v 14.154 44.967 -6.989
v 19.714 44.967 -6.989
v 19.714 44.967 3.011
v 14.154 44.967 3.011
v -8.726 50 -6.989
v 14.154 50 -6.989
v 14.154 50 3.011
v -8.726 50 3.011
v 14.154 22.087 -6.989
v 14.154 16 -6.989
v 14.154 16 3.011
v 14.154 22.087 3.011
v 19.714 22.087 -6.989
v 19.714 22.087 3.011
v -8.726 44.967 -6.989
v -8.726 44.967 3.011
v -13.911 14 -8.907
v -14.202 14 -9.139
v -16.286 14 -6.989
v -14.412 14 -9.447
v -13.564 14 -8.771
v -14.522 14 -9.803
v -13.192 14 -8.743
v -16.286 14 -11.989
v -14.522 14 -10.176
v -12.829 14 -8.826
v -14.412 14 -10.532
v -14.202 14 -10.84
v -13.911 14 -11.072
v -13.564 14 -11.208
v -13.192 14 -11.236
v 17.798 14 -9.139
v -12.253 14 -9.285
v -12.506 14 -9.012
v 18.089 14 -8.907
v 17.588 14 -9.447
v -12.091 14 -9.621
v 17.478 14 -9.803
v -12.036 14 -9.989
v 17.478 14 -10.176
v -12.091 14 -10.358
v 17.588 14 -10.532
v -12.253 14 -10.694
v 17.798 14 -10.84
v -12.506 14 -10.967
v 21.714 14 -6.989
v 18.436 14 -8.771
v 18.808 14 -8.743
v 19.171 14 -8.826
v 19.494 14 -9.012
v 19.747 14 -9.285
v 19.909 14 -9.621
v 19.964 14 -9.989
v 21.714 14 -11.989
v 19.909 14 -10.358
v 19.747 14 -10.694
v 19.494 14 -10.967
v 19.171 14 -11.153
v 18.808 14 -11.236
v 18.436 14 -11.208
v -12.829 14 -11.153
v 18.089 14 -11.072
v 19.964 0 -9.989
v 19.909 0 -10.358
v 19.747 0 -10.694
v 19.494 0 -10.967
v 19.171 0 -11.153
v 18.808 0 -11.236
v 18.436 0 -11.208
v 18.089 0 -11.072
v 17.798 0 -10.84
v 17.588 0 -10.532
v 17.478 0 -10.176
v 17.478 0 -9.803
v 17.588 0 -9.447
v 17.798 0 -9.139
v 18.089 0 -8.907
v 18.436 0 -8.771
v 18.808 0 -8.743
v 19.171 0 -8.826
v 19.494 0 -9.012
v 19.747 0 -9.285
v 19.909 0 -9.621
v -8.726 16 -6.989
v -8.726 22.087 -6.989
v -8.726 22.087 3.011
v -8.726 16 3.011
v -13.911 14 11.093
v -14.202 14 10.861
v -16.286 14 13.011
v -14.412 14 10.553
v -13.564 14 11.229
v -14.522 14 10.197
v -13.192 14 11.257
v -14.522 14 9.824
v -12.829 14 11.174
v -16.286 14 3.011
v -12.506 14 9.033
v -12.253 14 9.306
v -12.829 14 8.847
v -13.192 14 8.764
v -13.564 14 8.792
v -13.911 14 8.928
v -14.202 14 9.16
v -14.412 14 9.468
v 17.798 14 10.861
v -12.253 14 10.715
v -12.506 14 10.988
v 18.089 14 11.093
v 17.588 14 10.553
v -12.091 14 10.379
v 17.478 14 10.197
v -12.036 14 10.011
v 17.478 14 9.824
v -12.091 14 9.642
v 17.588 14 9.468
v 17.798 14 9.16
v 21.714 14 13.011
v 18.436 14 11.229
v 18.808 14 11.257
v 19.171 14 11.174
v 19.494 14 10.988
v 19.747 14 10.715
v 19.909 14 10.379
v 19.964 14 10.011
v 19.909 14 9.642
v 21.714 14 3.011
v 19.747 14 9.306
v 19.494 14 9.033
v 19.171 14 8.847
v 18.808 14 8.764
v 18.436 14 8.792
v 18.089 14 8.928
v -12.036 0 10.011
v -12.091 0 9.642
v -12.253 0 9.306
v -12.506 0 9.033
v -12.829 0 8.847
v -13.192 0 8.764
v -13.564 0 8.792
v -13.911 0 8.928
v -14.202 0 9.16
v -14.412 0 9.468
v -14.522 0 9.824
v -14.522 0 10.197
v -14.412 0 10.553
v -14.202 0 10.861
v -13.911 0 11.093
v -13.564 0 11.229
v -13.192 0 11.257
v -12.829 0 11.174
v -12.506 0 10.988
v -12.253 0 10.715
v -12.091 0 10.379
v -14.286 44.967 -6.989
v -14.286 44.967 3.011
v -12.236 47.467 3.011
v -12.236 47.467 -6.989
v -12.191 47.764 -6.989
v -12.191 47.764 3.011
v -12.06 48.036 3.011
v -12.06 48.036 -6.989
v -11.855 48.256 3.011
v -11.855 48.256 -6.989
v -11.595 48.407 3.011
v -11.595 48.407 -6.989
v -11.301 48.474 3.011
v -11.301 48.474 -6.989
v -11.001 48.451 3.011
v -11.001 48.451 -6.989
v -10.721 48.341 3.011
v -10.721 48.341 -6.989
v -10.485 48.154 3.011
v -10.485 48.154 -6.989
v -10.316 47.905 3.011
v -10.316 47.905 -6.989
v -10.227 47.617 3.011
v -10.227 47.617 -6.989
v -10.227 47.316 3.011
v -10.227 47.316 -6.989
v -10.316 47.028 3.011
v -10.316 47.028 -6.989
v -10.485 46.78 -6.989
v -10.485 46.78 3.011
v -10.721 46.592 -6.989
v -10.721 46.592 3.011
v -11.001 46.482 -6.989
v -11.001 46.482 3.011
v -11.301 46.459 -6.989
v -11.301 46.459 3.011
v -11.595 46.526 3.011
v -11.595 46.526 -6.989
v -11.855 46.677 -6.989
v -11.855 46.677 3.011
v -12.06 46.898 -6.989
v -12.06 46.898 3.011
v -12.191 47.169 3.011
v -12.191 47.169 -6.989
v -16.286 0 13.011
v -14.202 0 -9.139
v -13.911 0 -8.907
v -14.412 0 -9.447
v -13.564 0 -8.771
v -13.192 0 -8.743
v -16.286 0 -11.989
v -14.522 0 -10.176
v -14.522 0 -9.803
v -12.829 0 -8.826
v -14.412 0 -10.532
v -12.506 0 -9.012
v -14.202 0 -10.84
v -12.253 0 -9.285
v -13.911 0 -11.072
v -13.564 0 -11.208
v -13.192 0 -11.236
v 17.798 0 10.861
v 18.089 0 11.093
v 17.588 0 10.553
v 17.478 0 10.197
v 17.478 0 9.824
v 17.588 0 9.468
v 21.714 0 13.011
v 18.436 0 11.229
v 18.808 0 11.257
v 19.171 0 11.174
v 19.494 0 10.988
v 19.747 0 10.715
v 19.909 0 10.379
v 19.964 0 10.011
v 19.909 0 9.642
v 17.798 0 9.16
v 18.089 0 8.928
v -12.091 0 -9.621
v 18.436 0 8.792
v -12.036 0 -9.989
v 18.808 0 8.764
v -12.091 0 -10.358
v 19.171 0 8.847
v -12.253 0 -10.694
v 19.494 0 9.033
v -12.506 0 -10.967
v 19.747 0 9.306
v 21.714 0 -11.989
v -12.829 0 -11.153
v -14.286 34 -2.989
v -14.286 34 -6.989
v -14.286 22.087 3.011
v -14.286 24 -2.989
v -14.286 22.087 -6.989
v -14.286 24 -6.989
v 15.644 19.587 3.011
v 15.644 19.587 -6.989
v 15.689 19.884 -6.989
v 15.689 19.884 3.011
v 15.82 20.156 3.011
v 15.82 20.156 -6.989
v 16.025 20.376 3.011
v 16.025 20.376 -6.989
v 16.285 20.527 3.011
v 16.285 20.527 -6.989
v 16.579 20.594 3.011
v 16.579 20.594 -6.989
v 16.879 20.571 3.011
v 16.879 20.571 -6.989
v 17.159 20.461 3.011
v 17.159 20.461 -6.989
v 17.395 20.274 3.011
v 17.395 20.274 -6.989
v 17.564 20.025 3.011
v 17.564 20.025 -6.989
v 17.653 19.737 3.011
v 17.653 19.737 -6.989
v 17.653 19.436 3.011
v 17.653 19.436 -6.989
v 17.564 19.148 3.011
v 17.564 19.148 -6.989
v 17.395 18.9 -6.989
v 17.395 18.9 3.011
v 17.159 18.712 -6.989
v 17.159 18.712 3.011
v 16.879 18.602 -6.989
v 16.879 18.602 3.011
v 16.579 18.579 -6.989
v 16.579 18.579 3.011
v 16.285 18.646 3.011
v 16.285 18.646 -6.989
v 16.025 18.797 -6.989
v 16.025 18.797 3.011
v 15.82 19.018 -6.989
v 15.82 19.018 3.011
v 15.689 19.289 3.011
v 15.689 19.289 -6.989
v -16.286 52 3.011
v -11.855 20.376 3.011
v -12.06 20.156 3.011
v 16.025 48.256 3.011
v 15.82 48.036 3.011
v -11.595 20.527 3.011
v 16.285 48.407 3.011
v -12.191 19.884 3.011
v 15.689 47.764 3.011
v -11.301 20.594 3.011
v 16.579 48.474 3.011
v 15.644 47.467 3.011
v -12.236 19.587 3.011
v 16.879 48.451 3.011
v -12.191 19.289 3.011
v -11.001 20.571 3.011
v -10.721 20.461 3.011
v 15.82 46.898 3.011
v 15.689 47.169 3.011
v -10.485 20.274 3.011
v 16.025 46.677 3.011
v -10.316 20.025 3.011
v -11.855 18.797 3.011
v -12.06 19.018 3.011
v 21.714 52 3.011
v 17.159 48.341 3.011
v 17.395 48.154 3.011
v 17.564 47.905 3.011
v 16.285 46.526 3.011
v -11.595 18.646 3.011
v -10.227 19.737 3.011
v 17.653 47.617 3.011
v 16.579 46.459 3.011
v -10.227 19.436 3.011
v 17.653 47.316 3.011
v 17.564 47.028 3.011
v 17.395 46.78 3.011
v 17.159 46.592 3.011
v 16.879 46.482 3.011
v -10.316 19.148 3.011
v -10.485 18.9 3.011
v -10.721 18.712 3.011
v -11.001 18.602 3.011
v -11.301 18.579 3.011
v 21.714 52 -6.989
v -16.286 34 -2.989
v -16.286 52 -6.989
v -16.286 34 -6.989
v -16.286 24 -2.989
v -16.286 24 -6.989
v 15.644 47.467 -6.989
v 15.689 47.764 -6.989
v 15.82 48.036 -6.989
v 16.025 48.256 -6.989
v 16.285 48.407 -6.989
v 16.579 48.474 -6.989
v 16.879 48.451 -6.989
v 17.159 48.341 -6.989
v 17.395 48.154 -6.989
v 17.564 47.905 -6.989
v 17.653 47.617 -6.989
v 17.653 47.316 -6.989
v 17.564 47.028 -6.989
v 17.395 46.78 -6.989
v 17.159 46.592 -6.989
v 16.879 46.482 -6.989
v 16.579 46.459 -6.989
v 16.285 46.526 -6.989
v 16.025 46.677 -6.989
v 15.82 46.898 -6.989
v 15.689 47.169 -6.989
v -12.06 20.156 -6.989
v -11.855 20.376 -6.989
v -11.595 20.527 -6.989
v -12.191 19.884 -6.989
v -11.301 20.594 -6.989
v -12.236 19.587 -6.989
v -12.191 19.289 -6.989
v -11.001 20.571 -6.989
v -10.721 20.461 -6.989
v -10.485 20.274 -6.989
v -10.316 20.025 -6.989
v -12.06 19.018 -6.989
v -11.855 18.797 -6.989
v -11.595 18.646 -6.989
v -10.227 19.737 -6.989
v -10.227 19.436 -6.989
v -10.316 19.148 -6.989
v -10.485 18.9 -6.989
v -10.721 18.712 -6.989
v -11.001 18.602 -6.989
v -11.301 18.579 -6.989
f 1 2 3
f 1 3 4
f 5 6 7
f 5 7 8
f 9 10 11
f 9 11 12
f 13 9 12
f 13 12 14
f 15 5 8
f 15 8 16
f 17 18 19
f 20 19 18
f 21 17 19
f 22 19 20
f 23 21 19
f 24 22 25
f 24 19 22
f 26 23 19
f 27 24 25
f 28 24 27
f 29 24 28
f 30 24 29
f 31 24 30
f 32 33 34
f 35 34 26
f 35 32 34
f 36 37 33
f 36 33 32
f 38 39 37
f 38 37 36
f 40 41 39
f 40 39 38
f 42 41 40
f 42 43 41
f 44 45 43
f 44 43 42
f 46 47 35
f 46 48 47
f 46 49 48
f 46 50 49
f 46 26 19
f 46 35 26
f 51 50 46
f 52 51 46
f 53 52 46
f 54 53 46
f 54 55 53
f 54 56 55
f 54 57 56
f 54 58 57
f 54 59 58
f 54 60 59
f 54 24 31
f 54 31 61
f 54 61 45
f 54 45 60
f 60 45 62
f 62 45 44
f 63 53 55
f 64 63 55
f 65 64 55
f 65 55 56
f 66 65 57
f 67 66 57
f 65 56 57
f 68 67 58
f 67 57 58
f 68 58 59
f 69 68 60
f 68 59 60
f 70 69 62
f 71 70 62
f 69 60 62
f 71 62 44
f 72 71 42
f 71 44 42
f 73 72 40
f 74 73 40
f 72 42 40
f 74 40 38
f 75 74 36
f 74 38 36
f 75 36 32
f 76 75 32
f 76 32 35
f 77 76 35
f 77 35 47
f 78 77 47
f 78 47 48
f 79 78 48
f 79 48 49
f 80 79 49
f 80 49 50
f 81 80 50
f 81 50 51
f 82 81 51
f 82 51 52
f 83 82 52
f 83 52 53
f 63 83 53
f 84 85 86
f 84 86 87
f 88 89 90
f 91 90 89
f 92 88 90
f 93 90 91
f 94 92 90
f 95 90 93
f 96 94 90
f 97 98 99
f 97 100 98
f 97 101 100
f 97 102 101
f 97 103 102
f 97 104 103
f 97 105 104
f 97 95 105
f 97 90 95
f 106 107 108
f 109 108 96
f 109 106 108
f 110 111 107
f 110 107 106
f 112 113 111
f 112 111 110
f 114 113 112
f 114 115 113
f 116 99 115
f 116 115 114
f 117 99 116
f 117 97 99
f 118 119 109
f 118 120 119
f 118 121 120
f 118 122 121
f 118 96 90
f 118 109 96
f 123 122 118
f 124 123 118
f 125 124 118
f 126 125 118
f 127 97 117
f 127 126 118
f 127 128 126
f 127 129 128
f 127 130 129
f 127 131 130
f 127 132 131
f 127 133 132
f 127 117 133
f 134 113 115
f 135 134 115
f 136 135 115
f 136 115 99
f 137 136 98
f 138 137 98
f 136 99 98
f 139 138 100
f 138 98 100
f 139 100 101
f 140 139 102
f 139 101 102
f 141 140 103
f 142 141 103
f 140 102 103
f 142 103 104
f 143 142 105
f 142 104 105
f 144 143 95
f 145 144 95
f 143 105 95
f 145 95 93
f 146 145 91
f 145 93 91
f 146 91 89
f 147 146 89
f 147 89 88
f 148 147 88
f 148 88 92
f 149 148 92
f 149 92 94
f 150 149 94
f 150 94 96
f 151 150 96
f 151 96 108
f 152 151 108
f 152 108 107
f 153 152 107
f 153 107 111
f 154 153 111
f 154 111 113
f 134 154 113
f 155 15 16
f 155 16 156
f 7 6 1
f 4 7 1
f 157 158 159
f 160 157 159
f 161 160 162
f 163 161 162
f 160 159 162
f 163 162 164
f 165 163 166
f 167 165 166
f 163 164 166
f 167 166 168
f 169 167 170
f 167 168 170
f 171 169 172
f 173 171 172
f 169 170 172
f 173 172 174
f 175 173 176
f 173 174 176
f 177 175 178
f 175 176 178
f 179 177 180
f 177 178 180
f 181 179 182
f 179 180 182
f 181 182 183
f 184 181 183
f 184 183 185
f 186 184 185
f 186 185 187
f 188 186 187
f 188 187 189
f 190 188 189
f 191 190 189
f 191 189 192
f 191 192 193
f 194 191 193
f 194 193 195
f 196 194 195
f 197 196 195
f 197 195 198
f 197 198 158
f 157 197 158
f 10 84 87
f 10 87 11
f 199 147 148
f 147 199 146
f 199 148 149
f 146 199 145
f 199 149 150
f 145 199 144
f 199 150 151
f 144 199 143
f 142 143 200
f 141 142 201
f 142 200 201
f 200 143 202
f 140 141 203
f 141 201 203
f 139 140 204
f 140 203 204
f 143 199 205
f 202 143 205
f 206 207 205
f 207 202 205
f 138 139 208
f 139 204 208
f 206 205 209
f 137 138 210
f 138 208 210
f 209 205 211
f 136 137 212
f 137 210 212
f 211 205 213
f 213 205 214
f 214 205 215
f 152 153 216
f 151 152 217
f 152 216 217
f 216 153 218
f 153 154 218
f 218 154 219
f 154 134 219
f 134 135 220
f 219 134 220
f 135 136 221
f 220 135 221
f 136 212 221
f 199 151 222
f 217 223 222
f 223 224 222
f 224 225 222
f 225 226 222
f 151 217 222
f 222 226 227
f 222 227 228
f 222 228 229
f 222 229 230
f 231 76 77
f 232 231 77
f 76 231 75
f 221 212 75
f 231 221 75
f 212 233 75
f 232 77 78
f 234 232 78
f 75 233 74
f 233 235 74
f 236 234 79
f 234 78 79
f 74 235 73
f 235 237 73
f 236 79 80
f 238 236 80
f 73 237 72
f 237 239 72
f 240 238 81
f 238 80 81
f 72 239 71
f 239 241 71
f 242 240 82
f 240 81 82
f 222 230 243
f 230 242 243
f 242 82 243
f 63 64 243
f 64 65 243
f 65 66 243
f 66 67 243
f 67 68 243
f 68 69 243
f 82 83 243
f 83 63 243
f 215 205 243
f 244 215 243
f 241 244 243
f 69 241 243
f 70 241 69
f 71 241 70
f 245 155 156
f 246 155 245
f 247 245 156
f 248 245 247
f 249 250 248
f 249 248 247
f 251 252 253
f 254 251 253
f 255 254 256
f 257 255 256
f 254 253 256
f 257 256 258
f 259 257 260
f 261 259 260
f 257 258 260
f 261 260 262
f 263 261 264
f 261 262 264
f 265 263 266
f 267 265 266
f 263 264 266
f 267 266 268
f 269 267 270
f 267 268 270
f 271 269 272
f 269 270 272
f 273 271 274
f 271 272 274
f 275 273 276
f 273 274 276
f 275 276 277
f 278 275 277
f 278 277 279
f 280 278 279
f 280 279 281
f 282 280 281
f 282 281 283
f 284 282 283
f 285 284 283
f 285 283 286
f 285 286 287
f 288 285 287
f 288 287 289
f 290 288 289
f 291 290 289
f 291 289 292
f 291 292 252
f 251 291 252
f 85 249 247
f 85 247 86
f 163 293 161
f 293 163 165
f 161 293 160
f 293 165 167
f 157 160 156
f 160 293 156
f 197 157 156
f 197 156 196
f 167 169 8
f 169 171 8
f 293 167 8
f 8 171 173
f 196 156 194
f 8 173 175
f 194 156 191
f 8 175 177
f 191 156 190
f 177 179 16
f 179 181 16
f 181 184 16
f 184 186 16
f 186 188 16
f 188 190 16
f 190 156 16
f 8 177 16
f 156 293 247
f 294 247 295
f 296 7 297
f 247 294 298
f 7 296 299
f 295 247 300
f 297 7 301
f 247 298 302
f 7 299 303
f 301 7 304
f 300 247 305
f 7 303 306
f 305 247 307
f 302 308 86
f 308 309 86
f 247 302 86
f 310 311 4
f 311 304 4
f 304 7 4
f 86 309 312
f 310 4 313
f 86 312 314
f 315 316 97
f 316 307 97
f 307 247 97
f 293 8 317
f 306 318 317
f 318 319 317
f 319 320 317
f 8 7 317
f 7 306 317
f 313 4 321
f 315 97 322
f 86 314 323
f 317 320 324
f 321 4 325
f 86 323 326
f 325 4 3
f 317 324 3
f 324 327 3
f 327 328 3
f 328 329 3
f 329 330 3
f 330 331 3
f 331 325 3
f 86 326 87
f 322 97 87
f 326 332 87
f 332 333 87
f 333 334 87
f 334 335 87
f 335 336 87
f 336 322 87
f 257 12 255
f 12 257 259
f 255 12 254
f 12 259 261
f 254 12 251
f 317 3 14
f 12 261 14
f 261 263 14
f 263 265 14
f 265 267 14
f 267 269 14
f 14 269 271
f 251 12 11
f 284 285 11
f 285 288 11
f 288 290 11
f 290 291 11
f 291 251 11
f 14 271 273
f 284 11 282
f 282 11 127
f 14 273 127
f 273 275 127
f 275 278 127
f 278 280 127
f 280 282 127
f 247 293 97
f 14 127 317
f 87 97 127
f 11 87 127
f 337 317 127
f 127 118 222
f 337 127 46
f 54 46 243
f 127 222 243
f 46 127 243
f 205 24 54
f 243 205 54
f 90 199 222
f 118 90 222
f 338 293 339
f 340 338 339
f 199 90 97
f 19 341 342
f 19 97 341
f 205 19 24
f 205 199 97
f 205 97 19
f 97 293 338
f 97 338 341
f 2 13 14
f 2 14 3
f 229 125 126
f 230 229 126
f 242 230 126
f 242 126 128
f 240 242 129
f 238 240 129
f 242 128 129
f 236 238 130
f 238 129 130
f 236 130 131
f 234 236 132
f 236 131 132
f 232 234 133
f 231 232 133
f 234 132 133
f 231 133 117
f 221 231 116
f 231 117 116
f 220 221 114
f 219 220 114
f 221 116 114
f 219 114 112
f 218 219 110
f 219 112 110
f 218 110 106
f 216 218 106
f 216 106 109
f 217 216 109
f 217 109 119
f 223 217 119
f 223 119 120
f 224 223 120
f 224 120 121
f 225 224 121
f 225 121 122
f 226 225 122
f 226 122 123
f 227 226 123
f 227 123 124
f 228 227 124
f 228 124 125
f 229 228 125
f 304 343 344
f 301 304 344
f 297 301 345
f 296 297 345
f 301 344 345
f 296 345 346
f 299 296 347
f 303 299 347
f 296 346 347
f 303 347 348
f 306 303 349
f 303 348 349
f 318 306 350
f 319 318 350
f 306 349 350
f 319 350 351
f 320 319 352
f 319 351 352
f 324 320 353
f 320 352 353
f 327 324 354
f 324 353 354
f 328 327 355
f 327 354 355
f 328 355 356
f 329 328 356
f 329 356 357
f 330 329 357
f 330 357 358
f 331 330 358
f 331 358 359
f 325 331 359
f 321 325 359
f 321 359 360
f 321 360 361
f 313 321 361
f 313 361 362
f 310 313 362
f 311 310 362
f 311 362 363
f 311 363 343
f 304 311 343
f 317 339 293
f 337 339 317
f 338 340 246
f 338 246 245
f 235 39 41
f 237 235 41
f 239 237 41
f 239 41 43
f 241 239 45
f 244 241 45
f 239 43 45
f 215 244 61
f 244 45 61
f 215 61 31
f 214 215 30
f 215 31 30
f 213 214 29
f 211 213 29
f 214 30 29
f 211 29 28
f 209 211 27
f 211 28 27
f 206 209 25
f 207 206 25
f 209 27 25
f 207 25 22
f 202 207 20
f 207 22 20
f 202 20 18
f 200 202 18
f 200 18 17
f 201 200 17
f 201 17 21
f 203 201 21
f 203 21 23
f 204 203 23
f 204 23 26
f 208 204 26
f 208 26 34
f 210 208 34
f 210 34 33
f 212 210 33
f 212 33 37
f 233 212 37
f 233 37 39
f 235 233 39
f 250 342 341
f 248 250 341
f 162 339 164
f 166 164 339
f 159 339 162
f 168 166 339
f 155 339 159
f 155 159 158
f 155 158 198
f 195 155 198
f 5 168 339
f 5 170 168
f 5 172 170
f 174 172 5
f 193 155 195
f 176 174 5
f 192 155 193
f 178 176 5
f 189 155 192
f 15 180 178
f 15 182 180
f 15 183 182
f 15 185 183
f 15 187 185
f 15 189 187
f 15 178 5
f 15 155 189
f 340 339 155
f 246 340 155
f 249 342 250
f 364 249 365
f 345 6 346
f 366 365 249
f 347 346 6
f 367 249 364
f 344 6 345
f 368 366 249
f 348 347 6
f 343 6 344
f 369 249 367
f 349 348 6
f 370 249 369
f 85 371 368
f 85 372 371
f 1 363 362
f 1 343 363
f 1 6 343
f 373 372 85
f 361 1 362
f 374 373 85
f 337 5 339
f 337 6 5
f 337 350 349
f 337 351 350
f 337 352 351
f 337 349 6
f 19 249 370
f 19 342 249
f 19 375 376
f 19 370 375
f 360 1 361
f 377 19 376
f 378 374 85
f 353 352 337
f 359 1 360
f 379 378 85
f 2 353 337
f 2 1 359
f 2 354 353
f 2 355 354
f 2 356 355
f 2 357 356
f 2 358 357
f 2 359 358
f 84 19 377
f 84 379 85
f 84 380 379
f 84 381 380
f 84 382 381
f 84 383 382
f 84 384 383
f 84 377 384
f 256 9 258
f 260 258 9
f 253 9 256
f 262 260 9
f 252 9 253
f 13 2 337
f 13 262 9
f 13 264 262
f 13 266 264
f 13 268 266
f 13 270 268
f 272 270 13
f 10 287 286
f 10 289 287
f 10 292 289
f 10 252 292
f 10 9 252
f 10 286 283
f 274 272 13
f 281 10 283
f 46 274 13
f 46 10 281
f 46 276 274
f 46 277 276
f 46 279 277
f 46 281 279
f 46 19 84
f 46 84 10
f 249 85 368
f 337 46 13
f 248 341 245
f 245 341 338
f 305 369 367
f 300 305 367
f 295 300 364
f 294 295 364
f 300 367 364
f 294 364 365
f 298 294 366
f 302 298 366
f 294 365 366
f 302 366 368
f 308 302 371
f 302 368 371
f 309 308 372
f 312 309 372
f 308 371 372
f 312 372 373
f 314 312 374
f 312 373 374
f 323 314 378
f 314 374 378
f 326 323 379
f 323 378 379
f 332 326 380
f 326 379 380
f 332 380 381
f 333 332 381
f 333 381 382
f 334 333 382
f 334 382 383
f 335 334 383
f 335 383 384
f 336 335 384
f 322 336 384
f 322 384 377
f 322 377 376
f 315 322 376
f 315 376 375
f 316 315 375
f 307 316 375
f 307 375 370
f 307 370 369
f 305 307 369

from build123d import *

# Parameters (mm, degrees)
SKETCH1_W           = 38
SKETCH1_H           = 30
BOSS_EXTRUDE1_DEPTH = 14
SKETCH2_W           = 38
SKETCH2_H           = 10
BOSS_EXTRUDE2_DEPTH = 38
SKETCH3_R           = 1.01
CUT_EXTRUDE1_DEPTH  = 38
CUT_EXTRUDE2_DEPTH  = 38
SKETCH5_W           = 4
SKETCH5_H           = 10
CUT_EXTRUDE3_DEPTH  = 12
SKETCH6_R           = 1.25
CUT_EXTRUDE4_DEPTH  = 31
SKETCH8_W           = 38
SKETCH8_H           = 5
CUT_EXTRUDE5_DEPTH  = 31


with BuildPart() as part:
    # Sketch1 → Boss-Extrude1 (new body)
    with BuildSketch(Plane(origin=(0, 0, 0), x_dir=(1, 0, 0), z_dir=(0, 1, 0))):
        with Locations((2.714285714, 1.989417989)):
            Rectangle(SKETCH1_W, SKETCH1_H)
    extrude(amount=BOSS_EXTRUDE1_DEPTH)

    # Sketch2 → Boss-Extrude2 (add)
    with BuildSketch(Plane(origin=(0, 14, 0), x_dir=(1, 0, 0), z_dir=(0, 1, 0))):
        with Locations((2.714285714, 1.989417989)):
            Rectangle(SKETCH2_W, SKETCH2_H)
    extrude(amount=BOSS_EXTRUDE2_DEPTH)

    # Sketch3 → Cut-Extrude1 (cut)
    with BuildSketch(Plane(origin=(0, 0, -6.989417989), x_dir=(-1, 0, 0), z_dir=(0, 0, -1))):
        with Locations((-16.654285714, 47.466668182)):
            Circle(SKETCH3_R)
        with Locations((11.225714286, 47.466668182)):
            Circle(SKETCH3_R)
        with Locations((-16.654285714, 19.586668182)):
            Circle(SKETCH3_R)
        with Locations((11.225714286, 19.586668182)):
            Circle(SKETCH3_R)
    extrude(amount=-CUT_EXTRUDE1_DEPTH, mode=Mode.SUBTRACT)

    # Sketch4 → Cut-Extrude2 (cut)
    with BuildSketch(Plane(origin=(0, 0, -6.989417989), x_dir=(-1, 0, 0), z_dir=(0, 0, -1))):
        Polygon((-14.154285714, 47.396812474), (-14.154285714, 50), (8.725714286, 50), (8.725714286, 44.966668182), (14.285714286, 44.966668182), (14.285714286, 22.086668182), (8.725714286, 22.086668182), (8.725714286, 16), (-14.154285714, 16), (-14.154285714, 22.086668182), (-19.714285714, 22.086668182), (-19.714285714, 44.966668182), (-14.154285714, 44.966668182), align=None)
    extrude(amount=-CUT_EXTRUDE2_DEPTH, mode=Mode.SUBTRACT)

    # Sketch5 → Cut-Extrude3 (cut)
    with BuildSketch(Plane.ZY.offset(16.285714286)):
        with Locations((-4.989417989, 29)):
            Rectangle(SKETCH5_W, SKETCH5_H)
    extrude(amount=-CUT_EXTRUDE3_DEPTH, mode=Mode.SUBTRACT)

    # Sketch6 → Cut-Extrude4 (cut)
    with BuildSketch(Plane(origin=(0, 14, 0), x_dir=(1, 0, 0), z_dir=(0, 1, 0))):
        with Locations((-13.285714286, 9.989417989)):
            Circle(SKETCH6_R)
        with Locations((18.714285714, 9.989417989)):
            Circle(SKETCH6_R)
        with Locations((18.714285714, -10.010582011)):
            Circle(SKETCH6_R)
        with Locations((-13.285714286, -10.010582011)):
            Circle(SKETCH6_R)
    extrude(amount=-CUT_EXTRUDE4_DEPTH, mode=Mode.SUBTRACT)

    # Sketch8 → Cut-Extrude5 (cut)
    with BuildSketch(Plane(origin=(0, 14, 0), x_dir=(1, 0, 0), z_dir=(0, 1, 0))):
        with Locations((2.714285714, 14.489417989)):
            Rectangle(SKETCH8_W, SKETCH8_H)
    extrude(amount=-CUT_EXTRUDE5_DEPTH, mode=Mode.SUBTRACT)


solid = part.part
